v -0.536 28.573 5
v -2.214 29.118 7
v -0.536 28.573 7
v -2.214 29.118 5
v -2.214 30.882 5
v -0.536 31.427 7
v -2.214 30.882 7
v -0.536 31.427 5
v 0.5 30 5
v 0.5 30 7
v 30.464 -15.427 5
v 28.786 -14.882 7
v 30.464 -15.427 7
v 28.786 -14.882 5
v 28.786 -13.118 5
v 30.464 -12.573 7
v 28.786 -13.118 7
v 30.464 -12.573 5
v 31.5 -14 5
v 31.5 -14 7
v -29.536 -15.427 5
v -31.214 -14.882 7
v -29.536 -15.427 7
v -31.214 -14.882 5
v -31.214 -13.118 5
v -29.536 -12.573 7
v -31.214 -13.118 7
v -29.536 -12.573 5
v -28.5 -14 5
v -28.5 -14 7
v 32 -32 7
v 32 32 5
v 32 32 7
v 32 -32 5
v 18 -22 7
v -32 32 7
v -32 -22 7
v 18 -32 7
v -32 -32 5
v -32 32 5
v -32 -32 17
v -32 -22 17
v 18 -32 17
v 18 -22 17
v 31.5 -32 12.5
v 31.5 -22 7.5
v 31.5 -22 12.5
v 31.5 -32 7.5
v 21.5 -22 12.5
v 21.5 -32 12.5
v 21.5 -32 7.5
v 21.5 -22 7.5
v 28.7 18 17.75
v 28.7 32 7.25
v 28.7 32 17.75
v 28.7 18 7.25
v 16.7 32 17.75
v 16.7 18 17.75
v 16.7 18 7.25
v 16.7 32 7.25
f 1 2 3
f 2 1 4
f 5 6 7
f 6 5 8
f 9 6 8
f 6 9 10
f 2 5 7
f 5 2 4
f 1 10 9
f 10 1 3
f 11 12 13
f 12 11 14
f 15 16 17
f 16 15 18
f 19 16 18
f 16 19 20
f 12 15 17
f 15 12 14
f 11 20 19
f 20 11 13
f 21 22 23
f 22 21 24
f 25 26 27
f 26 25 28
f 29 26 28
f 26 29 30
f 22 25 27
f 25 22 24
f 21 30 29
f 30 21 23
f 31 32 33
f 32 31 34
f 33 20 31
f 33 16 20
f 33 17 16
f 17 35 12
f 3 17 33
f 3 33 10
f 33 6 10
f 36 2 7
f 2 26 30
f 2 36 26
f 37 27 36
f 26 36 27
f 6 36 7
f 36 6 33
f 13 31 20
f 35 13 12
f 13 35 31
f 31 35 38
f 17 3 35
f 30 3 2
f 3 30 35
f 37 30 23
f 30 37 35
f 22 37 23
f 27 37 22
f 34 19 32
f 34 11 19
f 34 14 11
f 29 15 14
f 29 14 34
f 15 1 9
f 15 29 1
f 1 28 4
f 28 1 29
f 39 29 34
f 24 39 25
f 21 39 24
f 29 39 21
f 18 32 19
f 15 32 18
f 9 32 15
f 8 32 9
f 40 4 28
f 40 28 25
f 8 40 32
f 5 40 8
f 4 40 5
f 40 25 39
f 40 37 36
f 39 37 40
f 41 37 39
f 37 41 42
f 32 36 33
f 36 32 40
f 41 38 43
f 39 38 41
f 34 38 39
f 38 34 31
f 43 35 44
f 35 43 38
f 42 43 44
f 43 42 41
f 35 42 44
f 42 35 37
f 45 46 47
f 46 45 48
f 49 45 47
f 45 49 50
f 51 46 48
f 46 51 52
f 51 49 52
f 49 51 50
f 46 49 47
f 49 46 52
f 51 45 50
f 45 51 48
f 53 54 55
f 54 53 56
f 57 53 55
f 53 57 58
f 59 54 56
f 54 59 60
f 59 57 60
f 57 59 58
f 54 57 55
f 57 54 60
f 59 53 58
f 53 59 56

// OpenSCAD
module gw_pos() {
    translate([-14.4, 190, 0]) children();
}

module gw_holes() {
    /*
    for (y = [-1, 1]) {
        for (x = [-1, 1]) {
            translate([x*34.5, y*16.2]) children();
        }
    }
    */
    
    translate([-1, 30]) children();
    translate([30.0, -14]) children();
    translate([-30.0, -14]) children();
}

module gw() {
    translate([0, 0, 6]) {
        color("darkgreen") difference() {
            cube([64, 64, 2], center=true);
            gw_holes() cylinder(d=3, h=10, center=true);
        }
        color("black") translate([-7, -27, 6]) cube([50, 10, 10], center=true);
        color("white") translate([26.5, -27, 4]) cube([10, 10, 5], center=true);
        color("grey") translate([22.7, 25, 6.5]) cube([12, 14, 10.5], center=true);
    }
}


gw();
